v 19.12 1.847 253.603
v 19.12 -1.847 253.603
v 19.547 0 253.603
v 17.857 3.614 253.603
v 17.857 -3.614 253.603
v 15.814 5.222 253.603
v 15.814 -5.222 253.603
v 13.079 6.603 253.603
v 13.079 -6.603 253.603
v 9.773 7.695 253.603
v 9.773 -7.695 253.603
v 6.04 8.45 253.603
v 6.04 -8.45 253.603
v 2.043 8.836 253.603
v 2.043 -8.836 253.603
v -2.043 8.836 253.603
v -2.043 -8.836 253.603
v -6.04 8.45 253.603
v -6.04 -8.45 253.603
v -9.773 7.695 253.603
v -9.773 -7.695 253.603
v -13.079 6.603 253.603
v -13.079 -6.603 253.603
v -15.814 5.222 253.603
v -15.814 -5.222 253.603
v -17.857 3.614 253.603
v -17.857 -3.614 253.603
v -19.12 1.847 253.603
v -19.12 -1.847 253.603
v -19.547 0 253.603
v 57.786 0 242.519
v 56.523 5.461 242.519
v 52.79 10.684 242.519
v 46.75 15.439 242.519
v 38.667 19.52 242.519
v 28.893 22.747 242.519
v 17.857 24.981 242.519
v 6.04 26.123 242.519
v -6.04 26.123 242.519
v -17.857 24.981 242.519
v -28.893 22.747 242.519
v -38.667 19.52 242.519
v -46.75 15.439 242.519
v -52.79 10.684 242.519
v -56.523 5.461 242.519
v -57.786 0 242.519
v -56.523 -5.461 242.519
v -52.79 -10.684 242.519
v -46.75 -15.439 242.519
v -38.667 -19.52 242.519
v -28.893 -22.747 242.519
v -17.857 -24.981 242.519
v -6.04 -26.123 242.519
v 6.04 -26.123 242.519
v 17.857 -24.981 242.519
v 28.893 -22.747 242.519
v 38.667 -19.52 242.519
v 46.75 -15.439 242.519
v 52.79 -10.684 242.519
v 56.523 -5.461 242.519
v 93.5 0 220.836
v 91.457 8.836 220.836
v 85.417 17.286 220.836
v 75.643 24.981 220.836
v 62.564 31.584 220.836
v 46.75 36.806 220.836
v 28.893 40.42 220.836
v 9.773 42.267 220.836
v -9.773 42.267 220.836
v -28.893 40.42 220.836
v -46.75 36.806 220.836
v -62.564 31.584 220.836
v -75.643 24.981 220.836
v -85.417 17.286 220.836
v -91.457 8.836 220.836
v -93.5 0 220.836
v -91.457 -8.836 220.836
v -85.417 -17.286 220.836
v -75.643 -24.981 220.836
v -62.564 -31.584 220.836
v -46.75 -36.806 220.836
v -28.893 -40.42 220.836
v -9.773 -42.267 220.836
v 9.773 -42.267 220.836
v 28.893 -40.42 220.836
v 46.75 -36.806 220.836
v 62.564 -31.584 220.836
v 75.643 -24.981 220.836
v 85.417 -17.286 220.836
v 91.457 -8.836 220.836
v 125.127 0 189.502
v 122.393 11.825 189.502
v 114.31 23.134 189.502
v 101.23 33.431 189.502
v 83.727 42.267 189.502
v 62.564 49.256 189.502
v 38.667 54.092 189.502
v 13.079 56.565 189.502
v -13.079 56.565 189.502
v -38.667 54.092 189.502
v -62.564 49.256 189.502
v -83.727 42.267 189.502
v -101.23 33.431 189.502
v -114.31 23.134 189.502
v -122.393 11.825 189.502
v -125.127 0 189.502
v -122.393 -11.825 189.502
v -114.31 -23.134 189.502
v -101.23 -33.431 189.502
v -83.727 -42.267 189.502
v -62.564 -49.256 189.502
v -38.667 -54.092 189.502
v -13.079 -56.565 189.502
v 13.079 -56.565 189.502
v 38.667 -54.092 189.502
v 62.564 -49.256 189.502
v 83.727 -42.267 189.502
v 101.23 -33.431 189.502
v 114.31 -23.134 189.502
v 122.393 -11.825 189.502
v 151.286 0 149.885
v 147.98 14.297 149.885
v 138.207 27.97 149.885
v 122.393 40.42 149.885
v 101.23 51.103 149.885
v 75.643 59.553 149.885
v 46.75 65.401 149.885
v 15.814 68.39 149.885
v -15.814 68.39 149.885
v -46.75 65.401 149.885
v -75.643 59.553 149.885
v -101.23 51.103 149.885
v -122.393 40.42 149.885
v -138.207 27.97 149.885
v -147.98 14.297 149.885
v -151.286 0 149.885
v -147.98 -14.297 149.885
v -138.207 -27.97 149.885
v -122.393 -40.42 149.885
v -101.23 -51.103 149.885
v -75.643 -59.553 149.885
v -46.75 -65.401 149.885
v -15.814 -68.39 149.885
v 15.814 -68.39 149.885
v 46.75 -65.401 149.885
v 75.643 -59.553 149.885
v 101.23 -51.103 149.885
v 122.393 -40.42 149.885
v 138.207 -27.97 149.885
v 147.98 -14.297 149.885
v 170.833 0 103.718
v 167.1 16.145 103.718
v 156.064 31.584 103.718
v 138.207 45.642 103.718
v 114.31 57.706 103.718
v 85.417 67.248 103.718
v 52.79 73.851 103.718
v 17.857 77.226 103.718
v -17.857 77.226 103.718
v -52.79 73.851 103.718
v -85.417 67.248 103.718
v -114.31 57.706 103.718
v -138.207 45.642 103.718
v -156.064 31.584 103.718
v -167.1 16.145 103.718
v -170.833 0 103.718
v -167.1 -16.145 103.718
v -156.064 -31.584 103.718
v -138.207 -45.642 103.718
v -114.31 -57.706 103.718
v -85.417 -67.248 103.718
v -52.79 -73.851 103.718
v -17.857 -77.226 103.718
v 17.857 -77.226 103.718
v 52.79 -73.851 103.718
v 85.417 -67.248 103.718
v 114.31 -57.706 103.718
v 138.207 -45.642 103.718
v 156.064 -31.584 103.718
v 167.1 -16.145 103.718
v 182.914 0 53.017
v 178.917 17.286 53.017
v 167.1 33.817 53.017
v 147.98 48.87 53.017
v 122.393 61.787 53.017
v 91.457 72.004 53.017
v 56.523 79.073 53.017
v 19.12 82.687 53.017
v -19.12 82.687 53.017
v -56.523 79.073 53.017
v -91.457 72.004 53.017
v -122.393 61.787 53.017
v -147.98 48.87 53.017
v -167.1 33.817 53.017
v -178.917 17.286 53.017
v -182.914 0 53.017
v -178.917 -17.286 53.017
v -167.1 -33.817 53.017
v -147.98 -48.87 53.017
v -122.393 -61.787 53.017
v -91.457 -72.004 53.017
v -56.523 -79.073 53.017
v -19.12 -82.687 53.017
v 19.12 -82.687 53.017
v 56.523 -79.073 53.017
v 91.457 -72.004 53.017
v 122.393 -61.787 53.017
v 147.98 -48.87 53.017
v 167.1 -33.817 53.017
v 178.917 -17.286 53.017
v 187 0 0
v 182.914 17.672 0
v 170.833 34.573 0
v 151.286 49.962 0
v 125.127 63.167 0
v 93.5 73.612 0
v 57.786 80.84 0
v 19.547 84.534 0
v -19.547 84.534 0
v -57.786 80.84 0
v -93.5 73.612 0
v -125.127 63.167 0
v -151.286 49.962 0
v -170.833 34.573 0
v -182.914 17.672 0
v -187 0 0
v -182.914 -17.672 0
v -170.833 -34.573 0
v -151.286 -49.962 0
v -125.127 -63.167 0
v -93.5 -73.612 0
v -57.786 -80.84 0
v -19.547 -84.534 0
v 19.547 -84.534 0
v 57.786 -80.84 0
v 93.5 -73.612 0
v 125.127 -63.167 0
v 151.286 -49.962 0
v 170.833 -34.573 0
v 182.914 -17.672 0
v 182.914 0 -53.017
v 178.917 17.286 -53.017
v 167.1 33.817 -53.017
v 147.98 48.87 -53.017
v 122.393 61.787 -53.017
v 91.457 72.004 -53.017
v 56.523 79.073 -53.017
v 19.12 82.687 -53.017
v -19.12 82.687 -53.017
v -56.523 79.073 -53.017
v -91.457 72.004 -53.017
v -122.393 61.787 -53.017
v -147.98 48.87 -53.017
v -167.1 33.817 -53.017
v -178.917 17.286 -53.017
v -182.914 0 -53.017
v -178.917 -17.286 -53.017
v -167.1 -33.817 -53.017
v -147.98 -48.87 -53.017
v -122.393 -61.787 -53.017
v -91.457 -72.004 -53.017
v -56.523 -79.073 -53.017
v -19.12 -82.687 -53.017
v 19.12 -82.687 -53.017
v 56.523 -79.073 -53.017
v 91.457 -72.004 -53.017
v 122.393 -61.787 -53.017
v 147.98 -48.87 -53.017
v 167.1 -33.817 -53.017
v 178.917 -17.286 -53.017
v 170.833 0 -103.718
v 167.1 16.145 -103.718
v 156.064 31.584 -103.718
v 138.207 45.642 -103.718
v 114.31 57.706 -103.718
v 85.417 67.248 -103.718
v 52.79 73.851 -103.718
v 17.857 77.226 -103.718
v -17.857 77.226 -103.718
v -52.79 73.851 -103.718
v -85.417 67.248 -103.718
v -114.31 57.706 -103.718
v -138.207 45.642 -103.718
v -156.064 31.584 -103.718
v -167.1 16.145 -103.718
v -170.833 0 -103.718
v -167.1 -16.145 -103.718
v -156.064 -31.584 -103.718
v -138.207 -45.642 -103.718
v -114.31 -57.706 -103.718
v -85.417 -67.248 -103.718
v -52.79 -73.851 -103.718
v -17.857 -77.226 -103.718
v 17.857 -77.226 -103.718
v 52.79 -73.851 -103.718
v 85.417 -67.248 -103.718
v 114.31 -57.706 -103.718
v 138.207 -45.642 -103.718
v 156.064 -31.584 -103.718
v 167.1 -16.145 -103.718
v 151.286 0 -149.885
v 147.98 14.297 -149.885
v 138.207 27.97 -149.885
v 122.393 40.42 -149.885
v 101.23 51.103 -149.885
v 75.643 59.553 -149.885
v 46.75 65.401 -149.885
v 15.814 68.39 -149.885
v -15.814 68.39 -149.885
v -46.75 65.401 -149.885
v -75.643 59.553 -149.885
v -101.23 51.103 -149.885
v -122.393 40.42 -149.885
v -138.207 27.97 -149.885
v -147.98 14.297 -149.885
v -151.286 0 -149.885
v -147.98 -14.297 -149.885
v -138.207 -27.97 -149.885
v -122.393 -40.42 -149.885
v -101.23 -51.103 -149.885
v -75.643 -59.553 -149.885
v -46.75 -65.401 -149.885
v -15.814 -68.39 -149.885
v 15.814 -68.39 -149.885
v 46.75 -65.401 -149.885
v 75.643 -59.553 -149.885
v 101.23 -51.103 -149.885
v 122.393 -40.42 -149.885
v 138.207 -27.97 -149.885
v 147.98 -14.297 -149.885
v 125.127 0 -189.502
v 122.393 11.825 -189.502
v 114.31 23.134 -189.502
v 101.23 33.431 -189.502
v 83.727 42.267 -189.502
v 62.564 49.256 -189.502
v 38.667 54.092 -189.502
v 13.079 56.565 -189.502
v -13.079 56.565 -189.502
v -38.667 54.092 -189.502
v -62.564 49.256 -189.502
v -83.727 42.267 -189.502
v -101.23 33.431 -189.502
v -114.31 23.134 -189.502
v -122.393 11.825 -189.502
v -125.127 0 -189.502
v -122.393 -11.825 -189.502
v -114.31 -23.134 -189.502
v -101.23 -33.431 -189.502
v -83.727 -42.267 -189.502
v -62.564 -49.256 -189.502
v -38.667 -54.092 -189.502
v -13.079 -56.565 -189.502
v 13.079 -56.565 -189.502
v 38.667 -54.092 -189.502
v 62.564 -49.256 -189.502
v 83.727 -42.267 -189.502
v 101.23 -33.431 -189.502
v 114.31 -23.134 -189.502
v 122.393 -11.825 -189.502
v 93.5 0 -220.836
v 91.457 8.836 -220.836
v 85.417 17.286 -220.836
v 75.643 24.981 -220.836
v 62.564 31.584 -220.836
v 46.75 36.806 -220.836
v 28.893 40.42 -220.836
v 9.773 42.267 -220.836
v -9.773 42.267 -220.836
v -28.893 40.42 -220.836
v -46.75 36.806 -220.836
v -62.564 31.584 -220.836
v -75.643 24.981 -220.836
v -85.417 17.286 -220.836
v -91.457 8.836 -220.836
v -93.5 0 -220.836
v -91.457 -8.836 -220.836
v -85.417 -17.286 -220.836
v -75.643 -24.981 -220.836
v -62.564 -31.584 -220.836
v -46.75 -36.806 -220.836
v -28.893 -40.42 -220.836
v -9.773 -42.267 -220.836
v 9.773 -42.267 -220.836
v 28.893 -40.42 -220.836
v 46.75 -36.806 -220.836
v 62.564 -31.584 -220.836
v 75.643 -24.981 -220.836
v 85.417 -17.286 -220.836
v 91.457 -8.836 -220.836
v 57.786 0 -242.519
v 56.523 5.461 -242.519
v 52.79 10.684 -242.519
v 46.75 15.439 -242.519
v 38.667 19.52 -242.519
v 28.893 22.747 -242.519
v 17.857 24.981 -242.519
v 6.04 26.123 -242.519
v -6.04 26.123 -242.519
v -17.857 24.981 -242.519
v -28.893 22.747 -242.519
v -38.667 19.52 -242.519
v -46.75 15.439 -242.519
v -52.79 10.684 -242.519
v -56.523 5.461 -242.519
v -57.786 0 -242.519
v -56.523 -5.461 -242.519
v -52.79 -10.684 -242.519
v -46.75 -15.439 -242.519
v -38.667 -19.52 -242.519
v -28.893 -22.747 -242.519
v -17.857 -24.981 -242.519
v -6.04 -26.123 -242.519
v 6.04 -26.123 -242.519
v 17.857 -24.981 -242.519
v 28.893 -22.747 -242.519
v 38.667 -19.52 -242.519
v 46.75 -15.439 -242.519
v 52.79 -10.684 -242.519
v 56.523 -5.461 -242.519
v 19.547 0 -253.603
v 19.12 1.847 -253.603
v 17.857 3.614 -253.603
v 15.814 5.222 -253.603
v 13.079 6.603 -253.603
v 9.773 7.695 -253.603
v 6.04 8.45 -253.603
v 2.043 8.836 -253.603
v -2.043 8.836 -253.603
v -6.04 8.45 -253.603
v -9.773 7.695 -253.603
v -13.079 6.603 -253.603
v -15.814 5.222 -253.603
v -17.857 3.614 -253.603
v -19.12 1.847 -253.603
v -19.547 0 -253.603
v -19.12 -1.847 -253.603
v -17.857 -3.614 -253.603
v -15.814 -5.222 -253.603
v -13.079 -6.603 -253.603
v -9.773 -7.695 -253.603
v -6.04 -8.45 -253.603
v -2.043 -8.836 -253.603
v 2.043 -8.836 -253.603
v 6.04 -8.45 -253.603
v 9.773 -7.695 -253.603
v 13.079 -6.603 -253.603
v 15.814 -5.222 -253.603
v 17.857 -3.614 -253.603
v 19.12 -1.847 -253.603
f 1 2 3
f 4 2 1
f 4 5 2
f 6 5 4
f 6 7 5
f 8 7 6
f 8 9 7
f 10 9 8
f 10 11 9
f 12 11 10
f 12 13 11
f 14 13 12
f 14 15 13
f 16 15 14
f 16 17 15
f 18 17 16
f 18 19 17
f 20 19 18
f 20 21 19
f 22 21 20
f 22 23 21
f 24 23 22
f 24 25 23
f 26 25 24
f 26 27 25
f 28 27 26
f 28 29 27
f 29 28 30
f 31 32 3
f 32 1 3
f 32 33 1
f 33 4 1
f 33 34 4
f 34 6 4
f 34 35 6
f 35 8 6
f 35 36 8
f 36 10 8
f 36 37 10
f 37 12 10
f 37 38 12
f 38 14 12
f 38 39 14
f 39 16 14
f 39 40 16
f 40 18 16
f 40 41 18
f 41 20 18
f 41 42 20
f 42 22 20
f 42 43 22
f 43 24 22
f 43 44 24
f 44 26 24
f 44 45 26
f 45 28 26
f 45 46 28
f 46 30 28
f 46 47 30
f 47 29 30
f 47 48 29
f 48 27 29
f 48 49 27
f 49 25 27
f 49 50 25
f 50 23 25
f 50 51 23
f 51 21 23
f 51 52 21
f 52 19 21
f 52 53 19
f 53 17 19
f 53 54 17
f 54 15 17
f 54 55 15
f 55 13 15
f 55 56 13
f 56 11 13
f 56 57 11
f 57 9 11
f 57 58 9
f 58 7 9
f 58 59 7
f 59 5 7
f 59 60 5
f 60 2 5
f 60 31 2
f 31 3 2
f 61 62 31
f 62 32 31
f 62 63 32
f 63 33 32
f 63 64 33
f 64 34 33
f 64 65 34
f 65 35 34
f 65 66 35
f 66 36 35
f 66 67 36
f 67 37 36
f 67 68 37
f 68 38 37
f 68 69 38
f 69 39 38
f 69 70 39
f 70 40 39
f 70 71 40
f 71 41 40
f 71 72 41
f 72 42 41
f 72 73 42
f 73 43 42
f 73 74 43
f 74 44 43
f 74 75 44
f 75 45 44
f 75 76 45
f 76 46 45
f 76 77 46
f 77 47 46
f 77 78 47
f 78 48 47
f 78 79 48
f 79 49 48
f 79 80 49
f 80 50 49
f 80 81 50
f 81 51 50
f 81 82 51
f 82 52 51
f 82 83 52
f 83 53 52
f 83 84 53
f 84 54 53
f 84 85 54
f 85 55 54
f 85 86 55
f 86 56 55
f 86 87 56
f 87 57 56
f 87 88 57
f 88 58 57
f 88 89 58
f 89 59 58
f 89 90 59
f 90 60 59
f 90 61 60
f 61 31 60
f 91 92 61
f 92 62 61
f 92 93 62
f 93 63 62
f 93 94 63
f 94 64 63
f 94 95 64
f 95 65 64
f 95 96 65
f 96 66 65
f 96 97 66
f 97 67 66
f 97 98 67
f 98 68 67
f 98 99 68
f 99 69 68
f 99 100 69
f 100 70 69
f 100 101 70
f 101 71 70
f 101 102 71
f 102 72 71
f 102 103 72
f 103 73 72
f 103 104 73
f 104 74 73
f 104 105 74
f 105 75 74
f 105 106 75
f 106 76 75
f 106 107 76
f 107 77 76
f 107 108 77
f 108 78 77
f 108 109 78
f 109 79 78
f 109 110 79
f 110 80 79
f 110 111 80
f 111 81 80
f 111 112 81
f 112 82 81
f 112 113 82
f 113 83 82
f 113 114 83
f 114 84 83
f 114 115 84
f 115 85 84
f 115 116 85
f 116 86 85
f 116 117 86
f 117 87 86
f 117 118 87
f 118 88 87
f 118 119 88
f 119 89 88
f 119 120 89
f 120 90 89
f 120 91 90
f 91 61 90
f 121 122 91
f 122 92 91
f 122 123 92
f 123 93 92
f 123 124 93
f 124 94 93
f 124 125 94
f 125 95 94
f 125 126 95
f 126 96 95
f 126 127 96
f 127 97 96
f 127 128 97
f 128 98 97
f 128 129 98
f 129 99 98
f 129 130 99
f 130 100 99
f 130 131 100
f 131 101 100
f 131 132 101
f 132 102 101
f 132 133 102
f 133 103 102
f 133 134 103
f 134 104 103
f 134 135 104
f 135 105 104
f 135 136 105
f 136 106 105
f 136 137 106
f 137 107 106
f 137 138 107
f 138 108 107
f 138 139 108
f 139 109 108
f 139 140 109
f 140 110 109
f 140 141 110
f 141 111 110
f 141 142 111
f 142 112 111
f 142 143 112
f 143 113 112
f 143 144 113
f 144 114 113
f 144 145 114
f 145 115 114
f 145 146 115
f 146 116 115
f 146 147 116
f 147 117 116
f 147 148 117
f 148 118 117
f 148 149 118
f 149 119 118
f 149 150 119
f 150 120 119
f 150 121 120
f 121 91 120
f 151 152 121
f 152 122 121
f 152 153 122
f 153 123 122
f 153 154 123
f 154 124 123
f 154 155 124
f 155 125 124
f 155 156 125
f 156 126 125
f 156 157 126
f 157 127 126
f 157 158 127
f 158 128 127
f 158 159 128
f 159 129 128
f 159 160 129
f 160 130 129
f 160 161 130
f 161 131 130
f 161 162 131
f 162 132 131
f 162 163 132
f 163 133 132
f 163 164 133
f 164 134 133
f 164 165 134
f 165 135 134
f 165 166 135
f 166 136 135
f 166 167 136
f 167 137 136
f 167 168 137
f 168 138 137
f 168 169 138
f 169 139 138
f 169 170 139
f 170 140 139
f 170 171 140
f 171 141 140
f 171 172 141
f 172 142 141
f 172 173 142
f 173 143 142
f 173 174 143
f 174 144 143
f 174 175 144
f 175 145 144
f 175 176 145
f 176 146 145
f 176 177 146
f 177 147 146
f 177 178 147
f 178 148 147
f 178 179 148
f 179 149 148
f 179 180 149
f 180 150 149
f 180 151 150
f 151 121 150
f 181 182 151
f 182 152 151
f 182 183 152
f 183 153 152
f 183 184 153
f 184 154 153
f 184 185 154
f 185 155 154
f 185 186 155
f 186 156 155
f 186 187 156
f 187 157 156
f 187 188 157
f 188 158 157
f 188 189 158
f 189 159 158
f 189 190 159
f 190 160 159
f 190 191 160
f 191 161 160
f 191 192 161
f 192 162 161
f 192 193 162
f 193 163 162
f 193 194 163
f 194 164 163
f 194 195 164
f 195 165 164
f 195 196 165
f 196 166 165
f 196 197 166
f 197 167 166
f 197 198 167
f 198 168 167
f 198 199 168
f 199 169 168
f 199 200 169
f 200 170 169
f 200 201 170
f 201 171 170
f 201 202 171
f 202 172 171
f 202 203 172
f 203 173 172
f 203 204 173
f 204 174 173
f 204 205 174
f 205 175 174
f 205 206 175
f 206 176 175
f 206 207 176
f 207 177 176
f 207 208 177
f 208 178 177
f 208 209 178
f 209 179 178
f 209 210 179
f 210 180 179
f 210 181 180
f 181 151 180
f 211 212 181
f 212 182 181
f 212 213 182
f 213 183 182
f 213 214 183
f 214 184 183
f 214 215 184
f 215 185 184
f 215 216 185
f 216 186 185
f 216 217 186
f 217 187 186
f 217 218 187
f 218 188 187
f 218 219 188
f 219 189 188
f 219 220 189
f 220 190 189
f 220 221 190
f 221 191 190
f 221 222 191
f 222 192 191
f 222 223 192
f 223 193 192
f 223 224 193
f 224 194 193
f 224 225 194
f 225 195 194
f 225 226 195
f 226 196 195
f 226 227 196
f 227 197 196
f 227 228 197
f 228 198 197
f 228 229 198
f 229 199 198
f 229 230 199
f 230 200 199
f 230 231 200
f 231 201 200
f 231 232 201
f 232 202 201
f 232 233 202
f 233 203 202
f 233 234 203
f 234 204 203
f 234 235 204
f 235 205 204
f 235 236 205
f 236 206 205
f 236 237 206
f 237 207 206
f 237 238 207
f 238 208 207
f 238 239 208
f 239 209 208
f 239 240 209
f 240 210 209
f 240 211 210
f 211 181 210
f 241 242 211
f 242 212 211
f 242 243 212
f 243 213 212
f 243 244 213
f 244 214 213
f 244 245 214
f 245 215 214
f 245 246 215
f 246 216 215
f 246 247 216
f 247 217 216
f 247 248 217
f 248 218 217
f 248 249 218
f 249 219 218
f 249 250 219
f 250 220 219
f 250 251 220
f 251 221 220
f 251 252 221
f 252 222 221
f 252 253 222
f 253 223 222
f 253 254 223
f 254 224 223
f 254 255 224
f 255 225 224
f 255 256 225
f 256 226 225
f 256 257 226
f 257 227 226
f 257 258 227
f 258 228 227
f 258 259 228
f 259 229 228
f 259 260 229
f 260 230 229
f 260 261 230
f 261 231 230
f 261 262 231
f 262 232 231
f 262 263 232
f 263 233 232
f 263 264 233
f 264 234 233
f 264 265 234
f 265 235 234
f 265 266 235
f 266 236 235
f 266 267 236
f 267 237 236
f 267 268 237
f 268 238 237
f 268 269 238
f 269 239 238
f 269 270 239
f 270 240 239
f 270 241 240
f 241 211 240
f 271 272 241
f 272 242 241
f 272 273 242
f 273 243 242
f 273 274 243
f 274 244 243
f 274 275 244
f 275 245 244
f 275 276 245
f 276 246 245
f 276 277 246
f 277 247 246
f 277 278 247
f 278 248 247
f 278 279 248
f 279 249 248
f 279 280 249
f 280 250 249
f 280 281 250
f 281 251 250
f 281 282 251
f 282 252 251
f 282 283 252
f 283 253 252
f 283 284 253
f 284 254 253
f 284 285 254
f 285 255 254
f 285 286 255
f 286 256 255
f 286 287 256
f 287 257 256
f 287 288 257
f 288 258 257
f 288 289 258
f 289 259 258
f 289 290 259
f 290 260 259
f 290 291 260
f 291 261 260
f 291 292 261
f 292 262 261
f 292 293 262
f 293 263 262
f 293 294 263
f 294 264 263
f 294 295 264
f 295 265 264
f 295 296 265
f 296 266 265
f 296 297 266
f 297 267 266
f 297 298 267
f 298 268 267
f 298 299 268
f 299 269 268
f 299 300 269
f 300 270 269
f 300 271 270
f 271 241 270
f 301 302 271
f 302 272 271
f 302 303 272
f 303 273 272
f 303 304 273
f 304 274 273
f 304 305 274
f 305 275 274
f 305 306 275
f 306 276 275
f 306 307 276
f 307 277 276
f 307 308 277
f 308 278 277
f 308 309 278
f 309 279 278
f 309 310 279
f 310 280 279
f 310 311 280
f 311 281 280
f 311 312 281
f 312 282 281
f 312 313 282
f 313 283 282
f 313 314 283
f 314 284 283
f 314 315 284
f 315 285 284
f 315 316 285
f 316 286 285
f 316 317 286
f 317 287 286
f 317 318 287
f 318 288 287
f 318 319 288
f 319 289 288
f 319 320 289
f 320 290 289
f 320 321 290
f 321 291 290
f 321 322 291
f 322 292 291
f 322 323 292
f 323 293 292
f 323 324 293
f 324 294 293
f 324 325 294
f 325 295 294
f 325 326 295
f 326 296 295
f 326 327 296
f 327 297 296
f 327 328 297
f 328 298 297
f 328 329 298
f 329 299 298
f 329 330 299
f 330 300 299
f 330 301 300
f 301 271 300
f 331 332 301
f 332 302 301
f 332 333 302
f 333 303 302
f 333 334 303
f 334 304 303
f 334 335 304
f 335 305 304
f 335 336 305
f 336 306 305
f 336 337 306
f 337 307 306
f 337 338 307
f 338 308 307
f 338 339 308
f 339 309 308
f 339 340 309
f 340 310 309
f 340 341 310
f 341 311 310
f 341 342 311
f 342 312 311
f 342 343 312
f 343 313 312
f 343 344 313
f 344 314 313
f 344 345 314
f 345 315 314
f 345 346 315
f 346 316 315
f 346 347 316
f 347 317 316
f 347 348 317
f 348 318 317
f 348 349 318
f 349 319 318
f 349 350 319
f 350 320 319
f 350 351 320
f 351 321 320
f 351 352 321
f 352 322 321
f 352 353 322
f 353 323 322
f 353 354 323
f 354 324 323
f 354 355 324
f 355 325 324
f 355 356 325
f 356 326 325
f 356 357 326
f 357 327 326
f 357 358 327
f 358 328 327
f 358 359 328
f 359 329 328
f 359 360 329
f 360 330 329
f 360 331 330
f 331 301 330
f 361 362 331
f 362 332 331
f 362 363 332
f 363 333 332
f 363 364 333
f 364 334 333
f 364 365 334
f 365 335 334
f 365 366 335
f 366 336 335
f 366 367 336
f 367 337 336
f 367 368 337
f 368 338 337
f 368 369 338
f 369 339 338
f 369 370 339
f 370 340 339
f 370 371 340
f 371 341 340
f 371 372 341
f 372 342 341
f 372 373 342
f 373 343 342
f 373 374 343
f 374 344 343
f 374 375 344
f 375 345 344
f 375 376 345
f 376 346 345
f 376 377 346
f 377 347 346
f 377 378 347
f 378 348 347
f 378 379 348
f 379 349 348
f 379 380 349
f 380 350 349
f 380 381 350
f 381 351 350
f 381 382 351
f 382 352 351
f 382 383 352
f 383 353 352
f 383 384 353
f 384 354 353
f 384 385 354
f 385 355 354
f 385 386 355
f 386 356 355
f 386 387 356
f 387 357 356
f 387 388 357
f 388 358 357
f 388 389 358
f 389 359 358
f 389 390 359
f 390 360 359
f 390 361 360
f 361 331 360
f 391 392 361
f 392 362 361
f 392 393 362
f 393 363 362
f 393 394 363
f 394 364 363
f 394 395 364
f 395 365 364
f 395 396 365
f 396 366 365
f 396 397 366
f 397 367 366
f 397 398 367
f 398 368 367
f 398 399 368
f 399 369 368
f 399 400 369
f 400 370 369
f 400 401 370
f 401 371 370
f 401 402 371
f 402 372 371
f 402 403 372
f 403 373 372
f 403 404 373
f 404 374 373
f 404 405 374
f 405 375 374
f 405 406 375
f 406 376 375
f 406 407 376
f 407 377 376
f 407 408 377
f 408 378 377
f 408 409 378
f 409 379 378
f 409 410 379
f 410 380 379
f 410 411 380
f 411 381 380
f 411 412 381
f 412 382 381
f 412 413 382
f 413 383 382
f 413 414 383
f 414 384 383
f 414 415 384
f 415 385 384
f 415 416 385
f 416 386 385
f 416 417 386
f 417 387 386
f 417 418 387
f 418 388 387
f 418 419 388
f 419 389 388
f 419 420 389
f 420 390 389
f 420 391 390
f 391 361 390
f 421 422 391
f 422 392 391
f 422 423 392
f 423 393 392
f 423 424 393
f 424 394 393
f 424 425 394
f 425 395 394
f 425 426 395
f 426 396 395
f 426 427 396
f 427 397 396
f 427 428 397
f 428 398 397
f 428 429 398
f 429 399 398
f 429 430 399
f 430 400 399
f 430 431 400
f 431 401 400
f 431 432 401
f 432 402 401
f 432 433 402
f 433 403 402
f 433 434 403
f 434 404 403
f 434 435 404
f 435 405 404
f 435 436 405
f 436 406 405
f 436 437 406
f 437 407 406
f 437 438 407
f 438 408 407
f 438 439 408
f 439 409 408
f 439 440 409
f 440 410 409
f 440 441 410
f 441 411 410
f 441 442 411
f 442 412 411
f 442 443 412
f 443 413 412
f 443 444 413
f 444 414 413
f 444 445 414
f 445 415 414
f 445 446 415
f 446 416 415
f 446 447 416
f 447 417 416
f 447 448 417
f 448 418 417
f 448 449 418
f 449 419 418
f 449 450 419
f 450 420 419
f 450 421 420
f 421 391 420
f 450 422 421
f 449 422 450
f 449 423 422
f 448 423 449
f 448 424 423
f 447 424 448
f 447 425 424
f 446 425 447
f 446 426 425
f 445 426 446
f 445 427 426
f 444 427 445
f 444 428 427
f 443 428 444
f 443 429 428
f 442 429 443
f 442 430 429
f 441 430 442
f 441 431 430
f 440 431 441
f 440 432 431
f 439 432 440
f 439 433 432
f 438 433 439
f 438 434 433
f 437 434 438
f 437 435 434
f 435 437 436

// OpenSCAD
// Generated by SolidPython 1.0.1 on 2020-07-29 00:46:49


scale(v = [11, 5, 15]) {
	sphere(r = 17);
}
/***********************************************
*********      SolidPython code:      **********
************************************************
 
# import packages: SolidPython
from solid import *
from solid.utils import *
from itertools import chain, combinations, permutations


class Resize:

    def __init__(self, scad_file):
        self.scad_file = scad_file
        #self.scad_file = import_scad(scad_file)
        # cone/cylinder param:
        self.r1 = 0
        self.r2 = 0
        self.h = 0
        # rectangular prism param:
        self.w = 0
        self.l = 0
        # ellipse param:
        self.r = 0

    # import OpenScad code (file name corresponds to shape)


    # classify shape + parameters
    def assign(self, param1, param2, param3):
        if self.scad_file == 'cone.scad':
            self.r1 = param1
            self.r2 = param2
            self.h = param3
        elif self.scad_file == 'cylinder.scad':
            self.r1 = param1
            self.r2 = param2
            self.h = param3
        elif self.scad_file == 'rectangularPrism.scad':
            self.h = param1
            self.l = param2
            self.w = param3
        else:
            self.r = param1
            self.h = param2

    # resize parameters
    def iterate(self):
        x = range(3, 20, 2)
        i = 1
        if self.scad_file == 'cone.scad':
            tempList = list(permutations(x, 2))
            for temp in tempList:
                param1 = temp[0]
                param2 = temp[1]
                filepath = 'produced_scad_files/' + 'cone' + str(param1) + '_' + str(param2) + '_' + '.scad'
                scad_render_to_file(cylinder(h=param1, r1=param2, r2=0), filepath)

        elif self.scad_file == 'cylinder.scad':
            tempList = list(permutations(x, 3))
            for temp in tempList:
                param1 = temp[0]
                param2 = temp[1]
                filepath = 'produced_scad_files/' + 'cylinder' + str(param1) + '_' + str(param2) + '_' + '.scad'
                scad_render_to_file(cylinder(h=param1, r1=param2, r2=param2), filepath)

        elif self.scad_file == 'rectangularPrism.scad':
            tempList = list(permutations(x, 3))
            for temp in tempList:
                param1 = temp[0]
                param2 = temp[1]
                param3 = temp[2]
                filepath = 'produced_scad_files/' + 'rectangularPrism' + str(param1) + '_' + str(param2) + '_' + str(
                    param3) + '.scad'
                scad_render_to_file(cube(size=(param1, param2, param3)), filepath)

        elif self.scad_file == 'ellipse.scad':
            tempList = list(permutations(x, 4))
            for temp in tempList:
                param1 = temp[0]
                param2 = temp[1]
                param3 = temp[2]
                param4 = temp[3]
                filepath = 'produced_scad_files/' + 'ellipse' + str(param1) + '_' + str(param2) + '_' + str(param3) + '_' + str(param4) + '.scad'
                scad_render_to_file(scale([param1, param2, param3])(sphere(r=param4)), filepath)

    def render_to_scadfile(self):
        scad_render_to_file(scad, 'example.scad') 
 
************************************************/
